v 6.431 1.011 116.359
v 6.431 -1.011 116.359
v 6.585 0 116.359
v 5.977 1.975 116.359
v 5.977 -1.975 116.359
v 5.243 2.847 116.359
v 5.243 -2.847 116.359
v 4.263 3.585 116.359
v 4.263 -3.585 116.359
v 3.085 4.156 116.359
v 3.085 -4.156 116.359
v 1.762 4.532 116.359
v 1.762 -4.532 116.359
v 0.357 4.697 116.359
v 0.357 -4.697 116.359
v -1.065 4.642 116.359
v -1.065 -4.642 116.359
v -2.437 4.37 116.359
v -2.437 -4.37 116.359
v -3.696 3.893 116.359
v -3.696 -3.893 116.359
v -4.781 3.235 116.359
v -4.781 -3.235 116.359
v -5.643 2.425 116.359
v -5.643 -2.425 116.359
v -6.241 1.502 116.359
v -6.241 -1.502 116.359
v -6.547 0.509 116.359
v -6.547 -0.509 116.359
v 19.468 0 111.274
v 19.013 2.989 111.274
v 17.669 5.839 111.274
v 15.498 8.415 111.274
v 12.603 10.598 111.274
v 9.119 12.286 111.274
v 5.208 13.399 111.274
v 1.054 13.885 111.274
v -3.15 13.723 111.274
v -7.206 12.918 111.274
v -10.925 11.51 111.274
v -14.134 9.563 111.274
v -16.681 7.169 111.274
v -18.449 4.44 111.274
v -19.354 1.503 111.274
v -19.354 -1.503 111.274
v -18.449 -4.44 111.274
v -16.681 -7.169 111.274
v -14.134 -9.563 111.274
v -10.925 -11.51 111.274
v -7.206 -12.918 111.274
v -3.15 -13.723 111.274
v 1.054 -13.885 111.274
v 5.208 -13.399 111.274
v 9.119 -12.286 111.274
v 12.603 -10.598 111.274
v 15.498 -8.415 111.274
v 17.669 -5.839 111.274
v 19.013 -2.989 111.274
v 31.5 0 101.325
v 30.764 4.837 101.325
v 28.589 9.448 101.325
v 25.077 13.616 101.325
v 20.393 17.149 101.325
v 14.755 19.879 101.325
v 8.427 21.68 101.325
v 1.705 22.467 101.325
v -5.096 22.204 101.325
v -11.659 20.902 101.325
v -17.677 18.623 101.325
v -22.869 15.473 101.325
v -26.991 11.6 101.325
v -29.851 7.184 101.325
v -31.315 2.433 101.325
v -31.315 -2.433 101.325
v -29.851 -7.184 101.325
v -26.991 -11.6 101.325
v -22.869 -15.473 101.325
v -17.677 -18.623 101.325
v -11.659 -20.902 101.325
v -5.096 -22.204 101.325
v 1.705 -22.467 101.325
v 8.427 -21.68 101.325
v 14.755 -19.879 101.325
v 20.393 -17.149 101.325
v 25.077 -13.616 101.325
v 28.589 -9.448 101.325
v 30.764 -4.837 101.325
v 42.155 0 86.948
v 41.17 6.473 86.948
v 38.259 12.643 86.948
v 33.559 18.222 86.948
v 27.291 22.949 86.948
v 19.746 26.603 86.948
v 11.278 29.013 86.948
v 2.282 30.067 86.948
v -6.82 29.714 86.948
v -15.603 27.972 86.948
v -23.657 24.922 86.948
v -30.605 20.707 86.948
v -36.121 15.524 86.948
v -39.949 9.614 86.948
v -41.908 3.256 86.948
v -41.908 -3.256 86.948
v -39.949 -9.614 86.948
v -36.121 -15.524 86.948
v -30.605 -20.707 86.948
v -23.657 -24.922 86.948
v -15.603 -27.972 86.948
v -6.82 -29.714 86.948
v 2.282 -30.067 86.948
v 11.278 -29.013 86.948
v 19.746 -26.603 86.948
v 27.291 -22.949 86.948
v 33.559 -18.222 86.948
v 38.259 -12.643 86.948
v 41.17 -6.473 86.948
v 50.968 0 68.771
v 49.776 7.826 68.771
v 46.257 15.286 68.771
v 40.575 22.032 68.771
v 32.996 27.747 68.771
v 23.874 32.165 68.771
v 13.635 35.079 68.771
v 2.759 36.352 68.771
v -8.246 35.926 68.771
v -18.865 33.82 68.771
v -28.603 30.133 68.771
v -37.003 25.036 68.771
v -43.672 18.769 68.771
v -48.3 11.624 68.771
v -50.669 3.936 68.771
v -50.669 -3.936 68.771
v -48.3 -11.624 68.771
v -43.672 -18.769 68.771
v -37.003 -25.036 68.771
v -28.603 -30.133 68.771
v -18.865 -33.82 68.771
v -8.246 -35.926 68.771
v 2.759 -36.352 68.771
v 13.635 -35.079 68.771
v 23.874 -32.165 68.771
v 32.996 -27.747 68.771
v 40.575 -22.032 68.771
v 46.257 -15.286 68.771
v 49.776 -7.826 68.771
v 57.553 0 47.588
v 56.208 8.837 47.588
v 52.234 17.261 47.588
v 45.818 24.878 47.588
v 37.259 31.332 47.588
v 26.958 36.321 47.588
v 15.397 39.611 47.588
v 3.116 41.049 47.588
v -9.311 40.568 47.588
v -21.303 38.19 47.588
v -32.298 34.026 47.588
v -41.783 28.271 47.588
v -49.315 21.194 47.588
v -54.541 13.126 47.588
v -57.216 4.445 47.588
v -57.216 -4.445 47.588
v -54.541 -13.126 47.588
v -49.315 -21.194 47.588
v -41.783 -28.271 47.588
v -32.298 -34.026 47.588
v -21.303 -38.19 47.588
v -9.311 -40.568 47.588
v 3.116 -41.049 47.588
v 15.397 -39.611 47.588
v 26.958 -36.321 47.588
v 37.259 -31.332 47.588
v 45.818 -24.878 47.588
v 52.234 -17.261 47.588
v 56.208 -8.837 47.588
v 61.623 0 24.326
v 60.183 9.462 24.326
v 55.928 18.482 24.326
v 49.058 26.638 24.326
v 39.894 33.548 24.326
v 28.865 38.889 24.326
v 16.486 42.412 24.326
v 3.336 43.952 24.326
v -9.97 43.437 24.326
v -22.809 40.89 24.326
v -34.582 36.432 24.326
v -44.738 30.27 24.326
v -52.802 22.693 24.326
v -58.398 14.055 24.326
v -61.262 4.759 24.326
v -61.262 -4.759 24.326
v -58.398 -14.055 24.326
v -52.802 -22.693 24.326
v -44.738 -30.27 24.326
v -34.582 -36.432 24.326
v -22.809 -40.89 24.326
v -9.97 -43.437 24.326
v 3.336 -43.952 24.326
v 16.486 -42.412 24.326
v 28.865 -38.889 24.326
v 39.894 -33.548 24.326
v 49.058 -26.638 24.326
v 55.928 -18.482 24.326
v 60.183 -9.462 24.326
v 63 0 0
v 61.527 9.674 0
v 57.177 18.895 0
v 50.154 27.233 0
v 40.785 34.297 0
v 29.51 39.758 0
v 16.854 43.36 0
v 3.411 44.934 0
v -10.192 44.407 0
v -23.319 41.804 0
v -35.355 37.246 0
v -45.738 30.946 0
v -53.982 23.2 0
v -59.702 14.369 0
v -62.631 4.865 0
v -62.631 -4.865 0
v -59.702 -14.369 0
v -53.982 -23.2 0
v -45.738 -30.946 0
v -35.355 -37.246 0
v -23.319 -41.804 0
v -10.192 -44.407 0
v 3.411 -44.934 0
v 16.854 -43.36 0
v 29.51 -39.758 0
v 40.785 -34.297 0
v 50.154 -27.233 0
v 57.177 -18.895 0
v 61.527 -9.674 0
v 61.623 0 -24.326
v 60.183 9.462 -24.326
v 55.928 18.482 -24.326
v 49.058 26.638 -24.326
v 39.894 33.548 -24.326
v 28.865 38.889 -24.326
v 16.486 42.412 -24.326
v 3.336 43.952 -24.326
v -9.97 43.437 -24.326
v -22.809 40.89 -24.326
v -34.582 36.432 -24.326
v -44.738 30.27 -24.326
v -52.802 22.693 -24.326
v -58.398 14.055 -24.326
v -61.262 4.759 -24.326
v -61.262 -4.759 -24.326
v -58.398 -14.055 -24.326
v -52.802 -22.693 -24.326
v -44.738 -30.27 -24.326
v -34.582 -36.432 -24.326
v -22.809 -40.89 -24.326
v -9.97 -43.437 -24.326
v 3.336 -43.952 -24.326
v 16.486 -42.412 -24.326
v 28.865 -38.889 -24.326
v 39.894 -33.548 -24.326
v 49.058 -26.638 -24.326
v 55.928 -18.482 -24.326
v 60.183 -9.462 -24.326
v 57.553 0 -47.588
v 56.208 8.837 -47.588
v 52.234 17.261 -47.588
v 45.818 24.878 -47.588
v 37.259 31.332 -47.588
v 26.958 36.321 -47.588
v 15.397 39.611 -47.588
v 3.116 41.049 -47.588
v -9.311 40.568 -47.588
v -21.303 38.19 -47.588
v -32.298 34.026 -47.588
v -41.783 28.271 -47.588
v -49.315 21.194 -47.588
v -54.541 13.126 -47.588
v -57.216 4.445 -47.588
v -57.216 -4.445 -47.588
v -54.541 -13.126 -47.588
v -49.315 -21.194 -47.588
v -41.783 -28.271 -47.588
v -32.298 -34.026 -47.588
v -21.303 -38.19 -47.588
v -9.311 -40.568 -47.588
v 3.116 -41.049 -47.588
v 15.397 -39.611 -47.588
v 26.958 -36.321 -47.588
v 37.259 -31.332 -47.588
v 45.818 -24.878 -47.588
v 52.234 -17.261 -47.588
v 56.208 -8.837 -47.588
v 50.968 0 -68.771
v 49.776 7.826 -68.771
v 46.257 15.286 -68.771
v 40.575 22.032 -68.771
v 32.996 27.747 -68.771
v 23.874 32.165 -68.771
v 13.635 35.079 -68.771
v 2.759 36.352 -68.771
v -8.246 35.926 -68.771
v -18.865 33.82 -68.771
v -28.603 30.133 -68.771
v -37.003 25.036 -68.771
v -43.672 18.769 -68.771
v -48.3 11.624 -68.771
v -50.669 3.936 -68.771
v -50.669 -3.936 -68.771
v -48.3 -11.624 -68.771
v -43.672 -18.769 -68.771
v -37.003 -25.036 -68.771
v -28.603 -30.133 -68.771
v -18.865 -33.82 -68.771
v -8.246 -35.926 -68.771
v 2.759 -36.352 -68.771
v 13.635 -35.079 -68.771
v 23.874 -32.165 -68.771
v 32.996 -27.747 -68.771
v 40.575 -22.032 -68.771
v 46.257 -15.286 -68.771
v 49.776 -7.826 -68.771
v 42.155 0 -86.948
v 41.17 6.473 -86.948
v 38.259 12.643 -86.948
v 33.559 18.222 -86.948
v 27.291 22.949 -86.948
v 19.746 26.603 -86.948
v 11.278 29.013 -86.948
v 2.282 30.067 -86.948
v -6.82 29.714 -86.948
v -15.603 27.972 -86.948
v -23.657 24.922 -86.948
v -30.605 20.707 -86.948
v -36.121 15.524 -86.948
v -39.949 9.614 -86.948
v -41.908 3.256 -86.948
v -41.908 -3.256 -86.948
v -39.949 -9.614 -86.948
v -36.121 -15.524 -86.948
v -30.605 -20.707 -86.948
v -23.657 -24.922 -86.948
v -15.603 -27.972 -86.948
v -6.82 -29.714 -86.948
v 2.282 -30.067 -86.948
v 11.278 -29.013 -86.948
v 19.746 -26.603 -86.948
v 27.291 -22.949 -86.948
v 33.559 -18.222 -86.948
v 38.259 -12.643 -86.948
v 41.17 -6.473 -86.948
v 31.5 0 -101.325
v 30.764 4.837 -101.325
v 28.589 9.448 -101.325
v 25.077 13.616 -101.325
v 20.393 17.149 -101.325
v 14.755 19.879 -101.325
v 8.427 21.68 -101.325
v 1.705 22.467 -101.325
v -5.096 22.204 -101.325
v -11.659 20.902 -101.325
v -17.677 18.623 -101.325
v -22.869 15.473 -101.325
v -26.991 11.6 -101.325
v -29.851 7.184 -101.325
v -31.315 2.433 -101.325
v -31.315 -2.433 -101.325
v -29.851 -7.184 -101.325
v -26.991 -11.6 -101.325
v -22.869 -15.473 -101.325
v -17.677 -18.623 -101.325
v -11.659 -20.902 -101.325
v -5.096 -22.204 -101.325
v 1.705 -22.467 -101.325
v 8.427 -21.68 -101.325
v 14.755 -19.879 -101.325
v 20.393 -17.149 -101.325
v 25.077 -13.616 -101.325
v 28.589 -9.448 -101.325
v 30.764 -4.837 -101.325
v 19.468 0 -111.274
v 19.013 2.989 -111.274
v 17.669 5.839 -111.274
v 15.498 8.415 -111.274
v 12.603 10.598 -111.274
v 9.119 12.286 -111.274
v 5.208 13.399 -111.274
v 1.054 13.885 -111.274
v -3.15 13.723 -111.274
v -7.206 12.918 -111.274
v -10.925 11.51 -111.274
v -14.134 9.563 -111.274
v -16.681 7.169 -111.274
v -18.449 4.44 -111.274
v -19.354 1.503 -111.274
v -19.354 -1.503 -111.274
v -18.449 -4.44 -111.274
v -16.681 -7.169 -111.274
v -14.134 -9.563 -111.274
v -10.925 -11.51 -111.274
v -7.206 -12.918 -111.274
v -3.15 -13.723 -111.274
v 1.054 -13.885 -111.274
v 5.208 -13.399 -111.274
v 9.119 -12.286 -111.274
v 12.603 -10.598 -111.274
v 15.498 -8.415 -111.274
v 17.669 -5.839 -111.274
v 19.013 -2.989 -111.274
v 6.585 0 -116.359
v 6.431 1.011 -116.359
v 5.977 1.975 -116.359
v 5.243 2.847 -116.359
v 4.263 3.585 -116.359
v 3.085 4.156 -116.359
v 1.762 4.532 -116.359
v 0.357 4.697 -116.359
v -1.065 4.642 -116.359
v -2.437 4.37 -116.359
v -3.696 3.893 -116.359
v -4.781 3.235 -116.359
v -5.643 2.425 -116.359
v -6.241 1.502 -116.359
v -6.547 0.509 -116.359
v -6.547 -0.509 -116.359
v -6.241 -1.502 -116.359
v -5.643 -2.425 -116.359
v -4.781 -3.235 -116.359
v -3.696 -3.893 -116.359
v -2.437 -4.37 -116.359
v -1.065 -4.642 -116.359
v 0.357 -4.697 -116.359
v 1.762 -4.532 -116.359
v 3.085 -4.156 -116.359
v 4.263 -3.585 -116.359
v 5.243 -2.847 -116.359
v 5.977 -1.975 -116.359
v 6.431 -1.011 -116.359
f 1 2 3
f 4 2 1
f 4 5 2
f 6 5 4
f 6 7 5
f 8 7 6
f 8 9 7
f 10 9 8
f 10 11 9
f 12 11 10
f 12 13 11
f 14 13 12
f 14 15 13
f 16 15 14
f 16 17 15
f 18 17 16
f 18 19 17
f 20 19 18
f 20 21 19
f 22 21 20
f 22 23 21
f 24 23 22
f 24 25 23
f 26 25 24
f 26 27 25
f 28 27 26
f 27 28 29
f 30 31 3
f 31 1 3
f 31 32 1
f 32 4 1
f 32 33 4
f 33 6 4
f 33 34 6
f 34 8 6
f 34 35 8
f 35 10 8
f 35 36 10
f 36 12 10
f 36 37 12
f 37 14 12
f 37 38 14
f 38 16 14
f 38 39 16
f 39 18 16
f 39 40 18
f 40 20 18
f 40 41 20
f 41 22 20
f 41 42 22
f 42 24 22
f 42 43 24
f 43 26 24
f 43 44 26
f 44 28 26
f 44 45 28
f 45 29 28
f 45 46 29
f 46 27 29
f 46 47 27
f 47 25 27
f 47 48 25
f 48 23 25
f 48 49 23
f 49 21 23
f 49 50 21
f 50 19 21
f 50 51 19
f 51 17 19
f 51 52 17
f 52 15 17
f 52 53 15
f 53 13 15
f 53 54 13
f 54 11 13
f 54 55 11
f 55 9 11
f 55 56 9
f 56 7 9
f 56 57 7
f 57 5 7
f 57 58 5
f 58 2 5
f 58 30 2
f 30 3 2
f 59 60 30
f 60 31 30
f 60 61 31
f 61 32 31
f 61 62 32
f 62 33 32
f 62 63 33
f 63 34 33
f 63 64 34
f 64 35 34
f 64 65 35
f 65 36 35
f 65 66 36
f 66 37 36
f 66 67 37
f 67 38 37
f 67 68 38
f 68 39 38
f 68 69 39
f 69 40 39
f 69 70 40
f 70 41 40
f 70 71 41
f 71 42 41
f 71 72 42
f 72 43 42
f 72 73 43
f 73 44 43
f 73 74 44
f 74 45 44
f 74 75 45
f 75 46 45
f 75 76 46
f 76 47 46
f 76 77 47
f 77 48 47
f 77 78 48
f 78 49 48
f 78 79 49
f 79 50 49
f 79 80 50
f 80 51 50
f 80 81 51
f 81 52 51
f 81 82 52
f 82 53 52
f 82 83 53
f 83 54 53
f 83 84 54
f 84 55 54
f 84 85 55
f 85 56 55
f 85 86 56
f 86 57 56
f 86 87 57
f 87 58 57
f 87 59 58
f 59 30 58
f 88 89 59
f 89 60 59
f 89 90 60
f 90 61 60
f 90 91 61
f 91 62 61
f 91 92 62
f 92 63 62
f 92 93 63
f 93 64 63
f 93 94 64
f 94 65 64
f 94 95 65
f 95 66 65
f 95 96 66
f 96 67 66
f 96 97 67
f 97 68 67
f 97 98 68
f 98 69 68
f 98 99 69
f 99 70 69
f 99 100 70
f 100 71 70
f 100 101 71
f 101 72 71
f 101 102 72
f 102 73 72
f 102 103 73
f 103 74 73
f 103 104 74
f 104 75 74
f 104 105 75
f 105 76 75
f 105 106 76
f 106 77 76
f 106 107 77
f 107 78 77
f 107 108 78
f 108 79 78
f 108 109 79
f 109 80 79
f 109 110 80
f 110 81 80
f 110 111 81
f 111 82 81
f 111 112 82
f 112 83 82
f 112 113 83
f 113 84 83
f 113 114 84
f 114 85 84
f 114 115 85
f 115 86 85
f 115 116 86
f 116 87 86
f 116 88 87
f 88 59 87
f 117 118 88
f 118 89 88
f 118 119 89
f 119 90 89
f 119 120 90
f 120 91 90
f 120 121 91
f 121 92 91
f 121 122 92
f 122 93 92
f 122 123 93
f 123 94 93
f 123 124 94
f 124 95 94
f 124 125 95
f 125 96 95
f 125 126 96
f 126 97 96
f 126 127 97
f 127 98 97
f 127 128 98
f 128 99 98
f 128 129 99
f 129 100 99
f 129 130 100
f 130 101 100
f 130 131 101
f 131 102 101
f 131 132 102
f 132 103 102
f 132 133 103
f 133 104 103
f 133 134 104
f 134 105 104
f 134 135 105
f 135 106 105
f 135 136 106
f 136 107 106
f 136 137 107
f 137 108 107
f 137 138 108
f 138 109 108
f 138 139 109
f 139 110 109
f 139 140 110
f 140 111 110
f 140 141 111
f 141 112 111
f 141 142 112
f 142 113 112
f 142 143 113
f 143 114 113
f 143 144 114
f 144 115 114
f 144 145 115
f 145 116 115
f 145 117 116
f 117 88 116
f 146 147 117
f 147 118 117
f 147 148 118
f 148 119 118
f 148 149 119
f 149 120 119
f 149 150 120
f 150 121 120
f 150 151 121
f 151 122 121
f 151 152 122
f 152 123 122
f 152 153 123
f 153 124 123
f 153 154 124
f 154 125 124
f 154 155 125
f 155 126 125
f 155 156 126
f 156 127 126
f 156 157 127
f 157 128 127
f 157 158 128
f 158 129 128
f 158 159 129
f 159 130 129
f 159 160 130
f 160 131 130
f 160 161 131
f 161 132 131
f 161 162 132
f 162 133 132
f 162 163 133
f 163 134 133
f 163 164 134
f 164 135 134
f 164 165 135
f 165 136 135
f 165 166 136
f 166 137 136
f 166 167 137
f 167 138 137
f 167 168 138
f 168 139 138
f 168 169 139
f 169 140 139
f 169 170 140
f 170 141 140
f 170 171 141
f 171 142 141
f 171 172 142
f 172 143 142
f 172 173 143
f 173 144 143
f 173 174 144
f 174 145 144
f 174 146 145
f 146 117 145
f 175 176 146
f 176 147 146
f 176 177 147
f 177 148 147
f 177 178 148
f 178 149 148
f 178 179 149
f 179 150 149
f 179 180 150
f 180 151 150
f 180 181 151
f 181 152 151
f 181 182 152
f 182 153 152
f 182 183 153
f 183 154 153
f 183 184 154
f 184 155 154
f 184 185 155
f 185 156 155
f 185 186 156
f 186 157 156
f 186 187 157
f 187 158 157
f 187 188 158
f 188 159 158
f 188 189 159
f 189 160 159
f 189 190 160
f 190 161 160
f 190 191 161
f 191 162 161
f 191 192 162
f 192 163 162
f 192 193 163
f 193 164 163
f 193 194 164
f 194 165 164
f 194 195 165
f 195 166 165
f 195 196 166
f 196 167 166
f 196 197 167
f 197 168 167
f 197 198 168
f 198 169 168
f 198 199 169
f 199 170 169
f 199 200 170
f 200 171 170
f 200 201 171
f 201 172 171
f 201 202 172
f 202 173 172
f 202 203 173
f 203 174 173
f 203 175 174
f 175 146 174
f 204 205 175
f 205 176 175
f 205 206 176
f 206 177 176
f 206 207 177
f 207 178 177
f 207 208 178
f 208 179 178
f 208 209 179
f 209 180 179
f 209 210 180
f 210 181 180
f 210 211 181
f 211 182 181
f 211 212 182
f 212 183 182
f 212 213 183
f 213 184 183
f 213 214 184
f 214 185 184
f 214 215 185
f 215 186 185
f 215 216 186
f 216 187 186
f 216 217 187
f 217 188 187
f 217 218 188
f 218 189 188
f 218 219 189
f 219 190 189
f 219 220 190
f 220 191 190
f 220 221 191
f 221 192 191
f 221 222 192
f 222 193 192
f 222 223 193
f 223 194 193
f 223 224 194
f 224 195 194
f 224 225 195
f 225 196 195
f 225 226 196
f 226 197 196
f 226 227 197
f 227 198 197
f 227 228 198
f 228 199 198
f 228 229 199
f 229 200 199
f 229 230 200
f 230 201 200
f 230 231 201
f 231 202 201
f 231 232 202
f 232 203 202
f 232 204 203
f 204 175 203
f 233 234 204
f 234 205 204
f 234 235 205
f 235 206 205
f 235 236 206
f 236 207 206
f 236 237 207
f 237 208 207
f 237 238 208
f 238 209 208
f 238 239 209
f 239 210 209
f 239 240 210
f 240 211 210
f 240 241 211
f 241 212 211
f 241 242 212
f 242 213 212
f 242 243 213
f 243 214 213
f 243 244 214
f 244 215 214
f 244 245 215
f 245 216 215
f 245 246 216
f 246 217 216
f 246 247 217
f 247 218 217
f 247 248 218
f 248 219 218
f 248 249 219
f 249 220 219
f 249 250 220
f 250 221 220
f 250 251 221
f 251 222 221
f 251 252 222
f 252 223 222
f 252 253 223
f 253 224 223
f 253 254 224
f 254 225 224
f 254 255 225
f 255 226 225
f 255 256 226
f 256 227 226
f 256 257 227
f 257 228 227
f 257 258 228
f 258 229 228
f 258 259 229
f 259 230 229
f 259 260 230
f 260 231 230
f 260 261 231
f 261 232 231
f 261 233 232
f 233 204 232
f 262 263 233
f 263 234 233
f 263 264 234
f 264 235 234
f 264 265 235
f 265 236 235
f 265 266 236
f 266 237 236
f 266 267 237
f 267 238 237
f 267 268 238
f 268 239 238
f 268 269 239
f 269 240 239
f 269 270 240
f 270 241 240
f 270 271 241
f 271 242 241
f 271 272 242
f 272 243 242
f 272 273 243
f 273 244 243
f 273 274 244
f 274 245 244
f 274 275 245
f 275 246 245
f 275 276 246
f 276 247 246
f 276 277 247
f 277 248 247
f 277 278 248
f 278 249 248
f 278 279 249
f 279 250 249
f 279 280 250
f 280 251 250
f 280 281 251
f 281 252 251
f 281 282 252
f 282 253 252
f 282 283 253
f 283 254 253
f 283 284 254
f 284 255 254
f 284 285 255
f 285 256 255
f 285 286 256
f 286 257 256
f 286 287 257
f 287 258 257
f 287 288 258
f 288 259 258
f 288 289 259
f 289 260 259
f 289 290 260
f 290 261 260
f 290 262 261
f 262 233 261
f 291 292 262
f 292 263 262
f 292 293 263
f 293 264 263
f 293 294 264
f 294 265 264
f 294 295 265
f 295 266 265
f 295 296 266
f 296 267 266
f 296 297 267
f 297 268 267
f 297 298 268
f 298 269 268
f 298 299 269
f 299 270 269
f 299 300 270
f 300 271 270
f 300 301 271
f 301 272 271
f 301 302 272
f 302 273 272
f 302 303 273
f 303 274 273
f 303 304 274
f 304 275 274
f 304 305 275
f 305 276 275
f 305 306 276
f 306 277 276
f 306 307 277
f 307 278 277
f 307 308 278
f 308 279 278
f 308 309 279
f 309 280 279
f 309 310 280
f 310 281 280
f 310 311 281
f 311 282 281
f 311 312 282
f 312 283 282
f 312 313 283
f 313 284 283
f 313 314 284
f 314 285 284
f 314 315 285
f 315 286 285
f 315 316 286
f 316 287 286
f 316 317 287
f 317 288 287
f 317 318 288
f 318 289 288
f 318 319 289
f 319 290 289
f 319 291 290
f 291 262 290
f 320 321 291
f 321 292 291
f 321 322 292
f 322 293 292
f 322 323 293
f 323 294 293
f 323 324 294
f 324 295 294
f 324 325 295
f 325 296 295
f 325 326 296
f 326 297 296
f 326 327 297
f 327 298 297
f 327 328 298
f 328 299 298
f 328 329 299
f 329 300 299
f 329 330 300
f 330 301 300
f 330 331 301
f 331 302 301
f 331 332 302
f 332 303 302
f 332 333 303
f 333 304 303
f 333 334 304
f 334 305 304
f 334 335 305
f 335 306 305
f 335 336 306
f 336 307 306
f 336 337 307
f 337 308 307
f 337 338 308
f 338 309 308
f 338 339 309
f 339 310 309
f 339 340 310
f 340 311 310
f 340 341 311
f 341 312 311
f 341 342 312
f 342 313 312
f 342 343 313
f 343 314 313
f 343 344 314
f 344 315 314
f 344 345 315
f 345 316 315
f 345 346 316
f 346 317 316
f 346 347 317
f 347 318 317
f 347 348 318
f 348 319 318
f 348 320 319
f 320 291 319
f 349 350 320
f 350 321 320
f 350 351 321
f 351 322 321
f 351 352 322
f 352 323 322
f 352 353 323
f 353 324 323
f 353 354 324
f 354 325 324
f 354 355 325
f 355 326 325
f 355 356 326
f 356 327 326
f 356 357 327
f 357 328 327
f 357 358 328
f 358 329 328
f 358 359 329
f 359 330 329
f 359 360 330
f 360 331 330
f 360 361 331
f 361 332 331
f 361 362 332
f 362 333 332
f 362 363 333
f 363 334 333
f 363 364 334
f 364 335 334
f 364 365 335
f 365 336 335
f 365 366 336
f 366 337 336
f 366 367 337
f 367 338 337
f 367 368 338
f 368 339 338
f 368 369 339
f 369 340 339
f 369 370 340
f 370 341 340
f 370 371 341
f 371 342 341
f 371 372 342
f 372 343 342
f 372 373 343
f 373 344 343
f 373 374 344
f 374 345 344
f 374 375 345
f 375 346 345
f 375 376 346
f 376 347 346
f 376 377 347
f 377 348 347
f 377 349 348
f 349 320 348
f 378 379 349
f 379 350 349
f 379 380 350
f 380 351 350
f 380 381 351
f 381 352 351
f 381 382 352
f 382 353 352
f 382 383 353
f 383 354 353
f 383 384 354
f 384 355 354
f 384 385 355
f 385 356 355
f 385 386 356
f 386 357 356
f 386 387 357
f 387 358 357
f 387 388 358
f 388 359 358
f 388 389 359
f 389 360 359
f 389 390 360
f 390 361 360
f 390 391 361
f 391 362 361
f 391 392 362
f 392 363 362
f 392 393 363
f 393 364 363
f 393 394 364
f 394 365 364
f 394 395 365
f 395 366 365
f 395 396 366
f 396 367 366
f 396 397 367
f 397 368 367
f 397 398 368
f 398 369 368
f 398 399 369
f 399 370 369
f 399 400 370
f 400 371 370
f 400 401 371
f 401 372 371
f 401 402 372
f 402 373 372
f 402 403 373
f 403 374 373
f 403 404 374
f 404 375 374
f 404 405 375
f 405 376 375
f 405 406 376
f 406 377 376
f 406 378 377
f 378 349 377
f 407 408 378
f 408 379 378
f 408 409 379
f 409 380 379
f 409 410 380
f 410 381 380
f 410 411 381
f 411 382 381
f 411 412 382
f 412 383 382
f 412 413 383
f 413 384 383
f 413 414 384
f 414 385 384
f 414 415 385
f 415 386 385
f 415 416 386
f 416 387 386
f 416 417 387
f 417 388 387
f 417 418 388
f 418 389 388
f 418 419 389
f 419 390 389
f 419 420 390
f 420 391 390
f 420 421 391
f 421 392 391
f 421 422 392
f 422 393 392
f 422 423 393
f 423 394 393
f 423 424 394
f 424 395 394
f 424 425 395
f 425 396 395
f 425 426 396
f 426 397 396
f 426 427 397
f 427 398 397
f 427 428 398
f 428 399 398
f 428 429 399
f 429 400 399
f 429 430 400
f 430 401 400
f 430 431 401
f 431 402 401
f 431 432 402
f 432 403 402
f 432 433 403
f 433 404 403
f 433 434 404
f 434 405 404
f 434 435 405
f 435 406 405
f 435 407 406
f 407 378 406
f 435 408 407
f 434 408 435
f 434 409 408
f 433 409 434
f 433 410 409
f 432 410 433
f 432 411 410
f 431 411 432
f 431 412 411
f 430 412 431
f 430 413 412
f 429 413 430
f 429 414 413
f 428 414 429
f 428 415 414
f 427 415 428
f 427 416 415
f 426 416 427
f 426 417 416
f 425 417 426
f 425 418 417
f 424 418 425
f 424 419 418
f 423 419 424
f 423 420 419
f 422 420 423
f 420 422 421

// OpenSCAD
// Generated by SolidPython 1.0.1 on 2020-07-29 00:46:47


scale(v = [7, 5, 13]) {
	sphere(r = 9);
}
/***********************************************
*********      SolidPython code:      **********
************************************************
 
# import packages: SolidPython
from solid import *
from solid.utils import *
from itertools import chain, combinations, permutations


class Resize:

    def __init__(self, scad_file):
        self.scad_file = scad_file
        #self.scad_file = import_scad(scad_file)
        # cone/cylinder param:
        self.r1 = 0
        self.r2 = 0
        self.h = 0
        # rectangular prism param:
        self.w = 0
        self.l = 0
        # ellipse param:
        self.r = 0

    # import OpenScad code (file name corresponds to shape)


    # classify shape + parameters
    def assign(self, param1, param2, param3):
        if self.scad_file == 'cone.scad':
            self.r1 = param1
            self.r2 = param2
            self.h = param3
        elif self.scad_file == 'cylinder.scad':
            self.r1 = param1
            self.r2 = param2
            self.h = param3
        elif self.scad_file == 'rectangularPrism.scad':
            self.h = param1
            self.l = param2
            self.w = param3
        else:
            self.r = param1
            self.h = param2

    # resize parameters
    def iterate(self):
        x = range(3, 20, 2)
        i = 1
        if self.scad_file == 'cone.scad':
            tempList = list(permutations(x, 2))
            for temp in tempList:
                param1 = temp[0]
                param2 = temp[1]
                filepath = 'produced_scad_files/' + 'cone' + str(param1) + '_' + str(param2) + '_' + '.scad'
                scad_render_to_file(cylinder(h=param1, r1=param2, r2=0), filepath)

        elif self.scad_file == 'cylinder.scad':
            tempList = list(permutations(x, 3))
            for temp in tempList:
                param1 = temp[0]
                param2 = temp[1]
                filepath = 'produced_scad_files/' + 'cylinder' + str(param1) + '_' + str(param2) + '_' + '.scad'
                scad_render_to_file(cylinder(h=param1, r1=param2, r2=param2), filepath)

        elif self.scad_file == 'rectangularPrism.scad':
            tempList = list(permutations(x, 3))
            for temp in tempList:
                param1 = temp[0]
                param2 = temp[1]
                param3 = temp[2]
                filepath = 'produced_scad_files/' + 'rectangularPrism' + str(param1) + '_' + str(param2) + '_' + str(
                    param3) + '.scad'
                scad_render_to_file(cube(size=(param1, param2, param3)), filepath)

        elif self.scad_file == 'ellipse.scad':
            tempList = list(permutations(x, 4))
            for temp in tempList:
                param1 = temp[0]
                param2 = temp[1]
                param3 = temp[2]
                param4 = temp[3]
                filepath = 'produced_scad_files/' + 'ellipse' + str(param1) + '_' + str(param2) + '_' + str(param3) + '_' + str(param4) + '.scad'
                scad_render_to_file(scale([param1, param2, param3])(sphere(r=param4)), filepath)

    def render_to_scadfile(self):
        scad_render_to_file(scad, 'example.scad') 
 
************************************************/
